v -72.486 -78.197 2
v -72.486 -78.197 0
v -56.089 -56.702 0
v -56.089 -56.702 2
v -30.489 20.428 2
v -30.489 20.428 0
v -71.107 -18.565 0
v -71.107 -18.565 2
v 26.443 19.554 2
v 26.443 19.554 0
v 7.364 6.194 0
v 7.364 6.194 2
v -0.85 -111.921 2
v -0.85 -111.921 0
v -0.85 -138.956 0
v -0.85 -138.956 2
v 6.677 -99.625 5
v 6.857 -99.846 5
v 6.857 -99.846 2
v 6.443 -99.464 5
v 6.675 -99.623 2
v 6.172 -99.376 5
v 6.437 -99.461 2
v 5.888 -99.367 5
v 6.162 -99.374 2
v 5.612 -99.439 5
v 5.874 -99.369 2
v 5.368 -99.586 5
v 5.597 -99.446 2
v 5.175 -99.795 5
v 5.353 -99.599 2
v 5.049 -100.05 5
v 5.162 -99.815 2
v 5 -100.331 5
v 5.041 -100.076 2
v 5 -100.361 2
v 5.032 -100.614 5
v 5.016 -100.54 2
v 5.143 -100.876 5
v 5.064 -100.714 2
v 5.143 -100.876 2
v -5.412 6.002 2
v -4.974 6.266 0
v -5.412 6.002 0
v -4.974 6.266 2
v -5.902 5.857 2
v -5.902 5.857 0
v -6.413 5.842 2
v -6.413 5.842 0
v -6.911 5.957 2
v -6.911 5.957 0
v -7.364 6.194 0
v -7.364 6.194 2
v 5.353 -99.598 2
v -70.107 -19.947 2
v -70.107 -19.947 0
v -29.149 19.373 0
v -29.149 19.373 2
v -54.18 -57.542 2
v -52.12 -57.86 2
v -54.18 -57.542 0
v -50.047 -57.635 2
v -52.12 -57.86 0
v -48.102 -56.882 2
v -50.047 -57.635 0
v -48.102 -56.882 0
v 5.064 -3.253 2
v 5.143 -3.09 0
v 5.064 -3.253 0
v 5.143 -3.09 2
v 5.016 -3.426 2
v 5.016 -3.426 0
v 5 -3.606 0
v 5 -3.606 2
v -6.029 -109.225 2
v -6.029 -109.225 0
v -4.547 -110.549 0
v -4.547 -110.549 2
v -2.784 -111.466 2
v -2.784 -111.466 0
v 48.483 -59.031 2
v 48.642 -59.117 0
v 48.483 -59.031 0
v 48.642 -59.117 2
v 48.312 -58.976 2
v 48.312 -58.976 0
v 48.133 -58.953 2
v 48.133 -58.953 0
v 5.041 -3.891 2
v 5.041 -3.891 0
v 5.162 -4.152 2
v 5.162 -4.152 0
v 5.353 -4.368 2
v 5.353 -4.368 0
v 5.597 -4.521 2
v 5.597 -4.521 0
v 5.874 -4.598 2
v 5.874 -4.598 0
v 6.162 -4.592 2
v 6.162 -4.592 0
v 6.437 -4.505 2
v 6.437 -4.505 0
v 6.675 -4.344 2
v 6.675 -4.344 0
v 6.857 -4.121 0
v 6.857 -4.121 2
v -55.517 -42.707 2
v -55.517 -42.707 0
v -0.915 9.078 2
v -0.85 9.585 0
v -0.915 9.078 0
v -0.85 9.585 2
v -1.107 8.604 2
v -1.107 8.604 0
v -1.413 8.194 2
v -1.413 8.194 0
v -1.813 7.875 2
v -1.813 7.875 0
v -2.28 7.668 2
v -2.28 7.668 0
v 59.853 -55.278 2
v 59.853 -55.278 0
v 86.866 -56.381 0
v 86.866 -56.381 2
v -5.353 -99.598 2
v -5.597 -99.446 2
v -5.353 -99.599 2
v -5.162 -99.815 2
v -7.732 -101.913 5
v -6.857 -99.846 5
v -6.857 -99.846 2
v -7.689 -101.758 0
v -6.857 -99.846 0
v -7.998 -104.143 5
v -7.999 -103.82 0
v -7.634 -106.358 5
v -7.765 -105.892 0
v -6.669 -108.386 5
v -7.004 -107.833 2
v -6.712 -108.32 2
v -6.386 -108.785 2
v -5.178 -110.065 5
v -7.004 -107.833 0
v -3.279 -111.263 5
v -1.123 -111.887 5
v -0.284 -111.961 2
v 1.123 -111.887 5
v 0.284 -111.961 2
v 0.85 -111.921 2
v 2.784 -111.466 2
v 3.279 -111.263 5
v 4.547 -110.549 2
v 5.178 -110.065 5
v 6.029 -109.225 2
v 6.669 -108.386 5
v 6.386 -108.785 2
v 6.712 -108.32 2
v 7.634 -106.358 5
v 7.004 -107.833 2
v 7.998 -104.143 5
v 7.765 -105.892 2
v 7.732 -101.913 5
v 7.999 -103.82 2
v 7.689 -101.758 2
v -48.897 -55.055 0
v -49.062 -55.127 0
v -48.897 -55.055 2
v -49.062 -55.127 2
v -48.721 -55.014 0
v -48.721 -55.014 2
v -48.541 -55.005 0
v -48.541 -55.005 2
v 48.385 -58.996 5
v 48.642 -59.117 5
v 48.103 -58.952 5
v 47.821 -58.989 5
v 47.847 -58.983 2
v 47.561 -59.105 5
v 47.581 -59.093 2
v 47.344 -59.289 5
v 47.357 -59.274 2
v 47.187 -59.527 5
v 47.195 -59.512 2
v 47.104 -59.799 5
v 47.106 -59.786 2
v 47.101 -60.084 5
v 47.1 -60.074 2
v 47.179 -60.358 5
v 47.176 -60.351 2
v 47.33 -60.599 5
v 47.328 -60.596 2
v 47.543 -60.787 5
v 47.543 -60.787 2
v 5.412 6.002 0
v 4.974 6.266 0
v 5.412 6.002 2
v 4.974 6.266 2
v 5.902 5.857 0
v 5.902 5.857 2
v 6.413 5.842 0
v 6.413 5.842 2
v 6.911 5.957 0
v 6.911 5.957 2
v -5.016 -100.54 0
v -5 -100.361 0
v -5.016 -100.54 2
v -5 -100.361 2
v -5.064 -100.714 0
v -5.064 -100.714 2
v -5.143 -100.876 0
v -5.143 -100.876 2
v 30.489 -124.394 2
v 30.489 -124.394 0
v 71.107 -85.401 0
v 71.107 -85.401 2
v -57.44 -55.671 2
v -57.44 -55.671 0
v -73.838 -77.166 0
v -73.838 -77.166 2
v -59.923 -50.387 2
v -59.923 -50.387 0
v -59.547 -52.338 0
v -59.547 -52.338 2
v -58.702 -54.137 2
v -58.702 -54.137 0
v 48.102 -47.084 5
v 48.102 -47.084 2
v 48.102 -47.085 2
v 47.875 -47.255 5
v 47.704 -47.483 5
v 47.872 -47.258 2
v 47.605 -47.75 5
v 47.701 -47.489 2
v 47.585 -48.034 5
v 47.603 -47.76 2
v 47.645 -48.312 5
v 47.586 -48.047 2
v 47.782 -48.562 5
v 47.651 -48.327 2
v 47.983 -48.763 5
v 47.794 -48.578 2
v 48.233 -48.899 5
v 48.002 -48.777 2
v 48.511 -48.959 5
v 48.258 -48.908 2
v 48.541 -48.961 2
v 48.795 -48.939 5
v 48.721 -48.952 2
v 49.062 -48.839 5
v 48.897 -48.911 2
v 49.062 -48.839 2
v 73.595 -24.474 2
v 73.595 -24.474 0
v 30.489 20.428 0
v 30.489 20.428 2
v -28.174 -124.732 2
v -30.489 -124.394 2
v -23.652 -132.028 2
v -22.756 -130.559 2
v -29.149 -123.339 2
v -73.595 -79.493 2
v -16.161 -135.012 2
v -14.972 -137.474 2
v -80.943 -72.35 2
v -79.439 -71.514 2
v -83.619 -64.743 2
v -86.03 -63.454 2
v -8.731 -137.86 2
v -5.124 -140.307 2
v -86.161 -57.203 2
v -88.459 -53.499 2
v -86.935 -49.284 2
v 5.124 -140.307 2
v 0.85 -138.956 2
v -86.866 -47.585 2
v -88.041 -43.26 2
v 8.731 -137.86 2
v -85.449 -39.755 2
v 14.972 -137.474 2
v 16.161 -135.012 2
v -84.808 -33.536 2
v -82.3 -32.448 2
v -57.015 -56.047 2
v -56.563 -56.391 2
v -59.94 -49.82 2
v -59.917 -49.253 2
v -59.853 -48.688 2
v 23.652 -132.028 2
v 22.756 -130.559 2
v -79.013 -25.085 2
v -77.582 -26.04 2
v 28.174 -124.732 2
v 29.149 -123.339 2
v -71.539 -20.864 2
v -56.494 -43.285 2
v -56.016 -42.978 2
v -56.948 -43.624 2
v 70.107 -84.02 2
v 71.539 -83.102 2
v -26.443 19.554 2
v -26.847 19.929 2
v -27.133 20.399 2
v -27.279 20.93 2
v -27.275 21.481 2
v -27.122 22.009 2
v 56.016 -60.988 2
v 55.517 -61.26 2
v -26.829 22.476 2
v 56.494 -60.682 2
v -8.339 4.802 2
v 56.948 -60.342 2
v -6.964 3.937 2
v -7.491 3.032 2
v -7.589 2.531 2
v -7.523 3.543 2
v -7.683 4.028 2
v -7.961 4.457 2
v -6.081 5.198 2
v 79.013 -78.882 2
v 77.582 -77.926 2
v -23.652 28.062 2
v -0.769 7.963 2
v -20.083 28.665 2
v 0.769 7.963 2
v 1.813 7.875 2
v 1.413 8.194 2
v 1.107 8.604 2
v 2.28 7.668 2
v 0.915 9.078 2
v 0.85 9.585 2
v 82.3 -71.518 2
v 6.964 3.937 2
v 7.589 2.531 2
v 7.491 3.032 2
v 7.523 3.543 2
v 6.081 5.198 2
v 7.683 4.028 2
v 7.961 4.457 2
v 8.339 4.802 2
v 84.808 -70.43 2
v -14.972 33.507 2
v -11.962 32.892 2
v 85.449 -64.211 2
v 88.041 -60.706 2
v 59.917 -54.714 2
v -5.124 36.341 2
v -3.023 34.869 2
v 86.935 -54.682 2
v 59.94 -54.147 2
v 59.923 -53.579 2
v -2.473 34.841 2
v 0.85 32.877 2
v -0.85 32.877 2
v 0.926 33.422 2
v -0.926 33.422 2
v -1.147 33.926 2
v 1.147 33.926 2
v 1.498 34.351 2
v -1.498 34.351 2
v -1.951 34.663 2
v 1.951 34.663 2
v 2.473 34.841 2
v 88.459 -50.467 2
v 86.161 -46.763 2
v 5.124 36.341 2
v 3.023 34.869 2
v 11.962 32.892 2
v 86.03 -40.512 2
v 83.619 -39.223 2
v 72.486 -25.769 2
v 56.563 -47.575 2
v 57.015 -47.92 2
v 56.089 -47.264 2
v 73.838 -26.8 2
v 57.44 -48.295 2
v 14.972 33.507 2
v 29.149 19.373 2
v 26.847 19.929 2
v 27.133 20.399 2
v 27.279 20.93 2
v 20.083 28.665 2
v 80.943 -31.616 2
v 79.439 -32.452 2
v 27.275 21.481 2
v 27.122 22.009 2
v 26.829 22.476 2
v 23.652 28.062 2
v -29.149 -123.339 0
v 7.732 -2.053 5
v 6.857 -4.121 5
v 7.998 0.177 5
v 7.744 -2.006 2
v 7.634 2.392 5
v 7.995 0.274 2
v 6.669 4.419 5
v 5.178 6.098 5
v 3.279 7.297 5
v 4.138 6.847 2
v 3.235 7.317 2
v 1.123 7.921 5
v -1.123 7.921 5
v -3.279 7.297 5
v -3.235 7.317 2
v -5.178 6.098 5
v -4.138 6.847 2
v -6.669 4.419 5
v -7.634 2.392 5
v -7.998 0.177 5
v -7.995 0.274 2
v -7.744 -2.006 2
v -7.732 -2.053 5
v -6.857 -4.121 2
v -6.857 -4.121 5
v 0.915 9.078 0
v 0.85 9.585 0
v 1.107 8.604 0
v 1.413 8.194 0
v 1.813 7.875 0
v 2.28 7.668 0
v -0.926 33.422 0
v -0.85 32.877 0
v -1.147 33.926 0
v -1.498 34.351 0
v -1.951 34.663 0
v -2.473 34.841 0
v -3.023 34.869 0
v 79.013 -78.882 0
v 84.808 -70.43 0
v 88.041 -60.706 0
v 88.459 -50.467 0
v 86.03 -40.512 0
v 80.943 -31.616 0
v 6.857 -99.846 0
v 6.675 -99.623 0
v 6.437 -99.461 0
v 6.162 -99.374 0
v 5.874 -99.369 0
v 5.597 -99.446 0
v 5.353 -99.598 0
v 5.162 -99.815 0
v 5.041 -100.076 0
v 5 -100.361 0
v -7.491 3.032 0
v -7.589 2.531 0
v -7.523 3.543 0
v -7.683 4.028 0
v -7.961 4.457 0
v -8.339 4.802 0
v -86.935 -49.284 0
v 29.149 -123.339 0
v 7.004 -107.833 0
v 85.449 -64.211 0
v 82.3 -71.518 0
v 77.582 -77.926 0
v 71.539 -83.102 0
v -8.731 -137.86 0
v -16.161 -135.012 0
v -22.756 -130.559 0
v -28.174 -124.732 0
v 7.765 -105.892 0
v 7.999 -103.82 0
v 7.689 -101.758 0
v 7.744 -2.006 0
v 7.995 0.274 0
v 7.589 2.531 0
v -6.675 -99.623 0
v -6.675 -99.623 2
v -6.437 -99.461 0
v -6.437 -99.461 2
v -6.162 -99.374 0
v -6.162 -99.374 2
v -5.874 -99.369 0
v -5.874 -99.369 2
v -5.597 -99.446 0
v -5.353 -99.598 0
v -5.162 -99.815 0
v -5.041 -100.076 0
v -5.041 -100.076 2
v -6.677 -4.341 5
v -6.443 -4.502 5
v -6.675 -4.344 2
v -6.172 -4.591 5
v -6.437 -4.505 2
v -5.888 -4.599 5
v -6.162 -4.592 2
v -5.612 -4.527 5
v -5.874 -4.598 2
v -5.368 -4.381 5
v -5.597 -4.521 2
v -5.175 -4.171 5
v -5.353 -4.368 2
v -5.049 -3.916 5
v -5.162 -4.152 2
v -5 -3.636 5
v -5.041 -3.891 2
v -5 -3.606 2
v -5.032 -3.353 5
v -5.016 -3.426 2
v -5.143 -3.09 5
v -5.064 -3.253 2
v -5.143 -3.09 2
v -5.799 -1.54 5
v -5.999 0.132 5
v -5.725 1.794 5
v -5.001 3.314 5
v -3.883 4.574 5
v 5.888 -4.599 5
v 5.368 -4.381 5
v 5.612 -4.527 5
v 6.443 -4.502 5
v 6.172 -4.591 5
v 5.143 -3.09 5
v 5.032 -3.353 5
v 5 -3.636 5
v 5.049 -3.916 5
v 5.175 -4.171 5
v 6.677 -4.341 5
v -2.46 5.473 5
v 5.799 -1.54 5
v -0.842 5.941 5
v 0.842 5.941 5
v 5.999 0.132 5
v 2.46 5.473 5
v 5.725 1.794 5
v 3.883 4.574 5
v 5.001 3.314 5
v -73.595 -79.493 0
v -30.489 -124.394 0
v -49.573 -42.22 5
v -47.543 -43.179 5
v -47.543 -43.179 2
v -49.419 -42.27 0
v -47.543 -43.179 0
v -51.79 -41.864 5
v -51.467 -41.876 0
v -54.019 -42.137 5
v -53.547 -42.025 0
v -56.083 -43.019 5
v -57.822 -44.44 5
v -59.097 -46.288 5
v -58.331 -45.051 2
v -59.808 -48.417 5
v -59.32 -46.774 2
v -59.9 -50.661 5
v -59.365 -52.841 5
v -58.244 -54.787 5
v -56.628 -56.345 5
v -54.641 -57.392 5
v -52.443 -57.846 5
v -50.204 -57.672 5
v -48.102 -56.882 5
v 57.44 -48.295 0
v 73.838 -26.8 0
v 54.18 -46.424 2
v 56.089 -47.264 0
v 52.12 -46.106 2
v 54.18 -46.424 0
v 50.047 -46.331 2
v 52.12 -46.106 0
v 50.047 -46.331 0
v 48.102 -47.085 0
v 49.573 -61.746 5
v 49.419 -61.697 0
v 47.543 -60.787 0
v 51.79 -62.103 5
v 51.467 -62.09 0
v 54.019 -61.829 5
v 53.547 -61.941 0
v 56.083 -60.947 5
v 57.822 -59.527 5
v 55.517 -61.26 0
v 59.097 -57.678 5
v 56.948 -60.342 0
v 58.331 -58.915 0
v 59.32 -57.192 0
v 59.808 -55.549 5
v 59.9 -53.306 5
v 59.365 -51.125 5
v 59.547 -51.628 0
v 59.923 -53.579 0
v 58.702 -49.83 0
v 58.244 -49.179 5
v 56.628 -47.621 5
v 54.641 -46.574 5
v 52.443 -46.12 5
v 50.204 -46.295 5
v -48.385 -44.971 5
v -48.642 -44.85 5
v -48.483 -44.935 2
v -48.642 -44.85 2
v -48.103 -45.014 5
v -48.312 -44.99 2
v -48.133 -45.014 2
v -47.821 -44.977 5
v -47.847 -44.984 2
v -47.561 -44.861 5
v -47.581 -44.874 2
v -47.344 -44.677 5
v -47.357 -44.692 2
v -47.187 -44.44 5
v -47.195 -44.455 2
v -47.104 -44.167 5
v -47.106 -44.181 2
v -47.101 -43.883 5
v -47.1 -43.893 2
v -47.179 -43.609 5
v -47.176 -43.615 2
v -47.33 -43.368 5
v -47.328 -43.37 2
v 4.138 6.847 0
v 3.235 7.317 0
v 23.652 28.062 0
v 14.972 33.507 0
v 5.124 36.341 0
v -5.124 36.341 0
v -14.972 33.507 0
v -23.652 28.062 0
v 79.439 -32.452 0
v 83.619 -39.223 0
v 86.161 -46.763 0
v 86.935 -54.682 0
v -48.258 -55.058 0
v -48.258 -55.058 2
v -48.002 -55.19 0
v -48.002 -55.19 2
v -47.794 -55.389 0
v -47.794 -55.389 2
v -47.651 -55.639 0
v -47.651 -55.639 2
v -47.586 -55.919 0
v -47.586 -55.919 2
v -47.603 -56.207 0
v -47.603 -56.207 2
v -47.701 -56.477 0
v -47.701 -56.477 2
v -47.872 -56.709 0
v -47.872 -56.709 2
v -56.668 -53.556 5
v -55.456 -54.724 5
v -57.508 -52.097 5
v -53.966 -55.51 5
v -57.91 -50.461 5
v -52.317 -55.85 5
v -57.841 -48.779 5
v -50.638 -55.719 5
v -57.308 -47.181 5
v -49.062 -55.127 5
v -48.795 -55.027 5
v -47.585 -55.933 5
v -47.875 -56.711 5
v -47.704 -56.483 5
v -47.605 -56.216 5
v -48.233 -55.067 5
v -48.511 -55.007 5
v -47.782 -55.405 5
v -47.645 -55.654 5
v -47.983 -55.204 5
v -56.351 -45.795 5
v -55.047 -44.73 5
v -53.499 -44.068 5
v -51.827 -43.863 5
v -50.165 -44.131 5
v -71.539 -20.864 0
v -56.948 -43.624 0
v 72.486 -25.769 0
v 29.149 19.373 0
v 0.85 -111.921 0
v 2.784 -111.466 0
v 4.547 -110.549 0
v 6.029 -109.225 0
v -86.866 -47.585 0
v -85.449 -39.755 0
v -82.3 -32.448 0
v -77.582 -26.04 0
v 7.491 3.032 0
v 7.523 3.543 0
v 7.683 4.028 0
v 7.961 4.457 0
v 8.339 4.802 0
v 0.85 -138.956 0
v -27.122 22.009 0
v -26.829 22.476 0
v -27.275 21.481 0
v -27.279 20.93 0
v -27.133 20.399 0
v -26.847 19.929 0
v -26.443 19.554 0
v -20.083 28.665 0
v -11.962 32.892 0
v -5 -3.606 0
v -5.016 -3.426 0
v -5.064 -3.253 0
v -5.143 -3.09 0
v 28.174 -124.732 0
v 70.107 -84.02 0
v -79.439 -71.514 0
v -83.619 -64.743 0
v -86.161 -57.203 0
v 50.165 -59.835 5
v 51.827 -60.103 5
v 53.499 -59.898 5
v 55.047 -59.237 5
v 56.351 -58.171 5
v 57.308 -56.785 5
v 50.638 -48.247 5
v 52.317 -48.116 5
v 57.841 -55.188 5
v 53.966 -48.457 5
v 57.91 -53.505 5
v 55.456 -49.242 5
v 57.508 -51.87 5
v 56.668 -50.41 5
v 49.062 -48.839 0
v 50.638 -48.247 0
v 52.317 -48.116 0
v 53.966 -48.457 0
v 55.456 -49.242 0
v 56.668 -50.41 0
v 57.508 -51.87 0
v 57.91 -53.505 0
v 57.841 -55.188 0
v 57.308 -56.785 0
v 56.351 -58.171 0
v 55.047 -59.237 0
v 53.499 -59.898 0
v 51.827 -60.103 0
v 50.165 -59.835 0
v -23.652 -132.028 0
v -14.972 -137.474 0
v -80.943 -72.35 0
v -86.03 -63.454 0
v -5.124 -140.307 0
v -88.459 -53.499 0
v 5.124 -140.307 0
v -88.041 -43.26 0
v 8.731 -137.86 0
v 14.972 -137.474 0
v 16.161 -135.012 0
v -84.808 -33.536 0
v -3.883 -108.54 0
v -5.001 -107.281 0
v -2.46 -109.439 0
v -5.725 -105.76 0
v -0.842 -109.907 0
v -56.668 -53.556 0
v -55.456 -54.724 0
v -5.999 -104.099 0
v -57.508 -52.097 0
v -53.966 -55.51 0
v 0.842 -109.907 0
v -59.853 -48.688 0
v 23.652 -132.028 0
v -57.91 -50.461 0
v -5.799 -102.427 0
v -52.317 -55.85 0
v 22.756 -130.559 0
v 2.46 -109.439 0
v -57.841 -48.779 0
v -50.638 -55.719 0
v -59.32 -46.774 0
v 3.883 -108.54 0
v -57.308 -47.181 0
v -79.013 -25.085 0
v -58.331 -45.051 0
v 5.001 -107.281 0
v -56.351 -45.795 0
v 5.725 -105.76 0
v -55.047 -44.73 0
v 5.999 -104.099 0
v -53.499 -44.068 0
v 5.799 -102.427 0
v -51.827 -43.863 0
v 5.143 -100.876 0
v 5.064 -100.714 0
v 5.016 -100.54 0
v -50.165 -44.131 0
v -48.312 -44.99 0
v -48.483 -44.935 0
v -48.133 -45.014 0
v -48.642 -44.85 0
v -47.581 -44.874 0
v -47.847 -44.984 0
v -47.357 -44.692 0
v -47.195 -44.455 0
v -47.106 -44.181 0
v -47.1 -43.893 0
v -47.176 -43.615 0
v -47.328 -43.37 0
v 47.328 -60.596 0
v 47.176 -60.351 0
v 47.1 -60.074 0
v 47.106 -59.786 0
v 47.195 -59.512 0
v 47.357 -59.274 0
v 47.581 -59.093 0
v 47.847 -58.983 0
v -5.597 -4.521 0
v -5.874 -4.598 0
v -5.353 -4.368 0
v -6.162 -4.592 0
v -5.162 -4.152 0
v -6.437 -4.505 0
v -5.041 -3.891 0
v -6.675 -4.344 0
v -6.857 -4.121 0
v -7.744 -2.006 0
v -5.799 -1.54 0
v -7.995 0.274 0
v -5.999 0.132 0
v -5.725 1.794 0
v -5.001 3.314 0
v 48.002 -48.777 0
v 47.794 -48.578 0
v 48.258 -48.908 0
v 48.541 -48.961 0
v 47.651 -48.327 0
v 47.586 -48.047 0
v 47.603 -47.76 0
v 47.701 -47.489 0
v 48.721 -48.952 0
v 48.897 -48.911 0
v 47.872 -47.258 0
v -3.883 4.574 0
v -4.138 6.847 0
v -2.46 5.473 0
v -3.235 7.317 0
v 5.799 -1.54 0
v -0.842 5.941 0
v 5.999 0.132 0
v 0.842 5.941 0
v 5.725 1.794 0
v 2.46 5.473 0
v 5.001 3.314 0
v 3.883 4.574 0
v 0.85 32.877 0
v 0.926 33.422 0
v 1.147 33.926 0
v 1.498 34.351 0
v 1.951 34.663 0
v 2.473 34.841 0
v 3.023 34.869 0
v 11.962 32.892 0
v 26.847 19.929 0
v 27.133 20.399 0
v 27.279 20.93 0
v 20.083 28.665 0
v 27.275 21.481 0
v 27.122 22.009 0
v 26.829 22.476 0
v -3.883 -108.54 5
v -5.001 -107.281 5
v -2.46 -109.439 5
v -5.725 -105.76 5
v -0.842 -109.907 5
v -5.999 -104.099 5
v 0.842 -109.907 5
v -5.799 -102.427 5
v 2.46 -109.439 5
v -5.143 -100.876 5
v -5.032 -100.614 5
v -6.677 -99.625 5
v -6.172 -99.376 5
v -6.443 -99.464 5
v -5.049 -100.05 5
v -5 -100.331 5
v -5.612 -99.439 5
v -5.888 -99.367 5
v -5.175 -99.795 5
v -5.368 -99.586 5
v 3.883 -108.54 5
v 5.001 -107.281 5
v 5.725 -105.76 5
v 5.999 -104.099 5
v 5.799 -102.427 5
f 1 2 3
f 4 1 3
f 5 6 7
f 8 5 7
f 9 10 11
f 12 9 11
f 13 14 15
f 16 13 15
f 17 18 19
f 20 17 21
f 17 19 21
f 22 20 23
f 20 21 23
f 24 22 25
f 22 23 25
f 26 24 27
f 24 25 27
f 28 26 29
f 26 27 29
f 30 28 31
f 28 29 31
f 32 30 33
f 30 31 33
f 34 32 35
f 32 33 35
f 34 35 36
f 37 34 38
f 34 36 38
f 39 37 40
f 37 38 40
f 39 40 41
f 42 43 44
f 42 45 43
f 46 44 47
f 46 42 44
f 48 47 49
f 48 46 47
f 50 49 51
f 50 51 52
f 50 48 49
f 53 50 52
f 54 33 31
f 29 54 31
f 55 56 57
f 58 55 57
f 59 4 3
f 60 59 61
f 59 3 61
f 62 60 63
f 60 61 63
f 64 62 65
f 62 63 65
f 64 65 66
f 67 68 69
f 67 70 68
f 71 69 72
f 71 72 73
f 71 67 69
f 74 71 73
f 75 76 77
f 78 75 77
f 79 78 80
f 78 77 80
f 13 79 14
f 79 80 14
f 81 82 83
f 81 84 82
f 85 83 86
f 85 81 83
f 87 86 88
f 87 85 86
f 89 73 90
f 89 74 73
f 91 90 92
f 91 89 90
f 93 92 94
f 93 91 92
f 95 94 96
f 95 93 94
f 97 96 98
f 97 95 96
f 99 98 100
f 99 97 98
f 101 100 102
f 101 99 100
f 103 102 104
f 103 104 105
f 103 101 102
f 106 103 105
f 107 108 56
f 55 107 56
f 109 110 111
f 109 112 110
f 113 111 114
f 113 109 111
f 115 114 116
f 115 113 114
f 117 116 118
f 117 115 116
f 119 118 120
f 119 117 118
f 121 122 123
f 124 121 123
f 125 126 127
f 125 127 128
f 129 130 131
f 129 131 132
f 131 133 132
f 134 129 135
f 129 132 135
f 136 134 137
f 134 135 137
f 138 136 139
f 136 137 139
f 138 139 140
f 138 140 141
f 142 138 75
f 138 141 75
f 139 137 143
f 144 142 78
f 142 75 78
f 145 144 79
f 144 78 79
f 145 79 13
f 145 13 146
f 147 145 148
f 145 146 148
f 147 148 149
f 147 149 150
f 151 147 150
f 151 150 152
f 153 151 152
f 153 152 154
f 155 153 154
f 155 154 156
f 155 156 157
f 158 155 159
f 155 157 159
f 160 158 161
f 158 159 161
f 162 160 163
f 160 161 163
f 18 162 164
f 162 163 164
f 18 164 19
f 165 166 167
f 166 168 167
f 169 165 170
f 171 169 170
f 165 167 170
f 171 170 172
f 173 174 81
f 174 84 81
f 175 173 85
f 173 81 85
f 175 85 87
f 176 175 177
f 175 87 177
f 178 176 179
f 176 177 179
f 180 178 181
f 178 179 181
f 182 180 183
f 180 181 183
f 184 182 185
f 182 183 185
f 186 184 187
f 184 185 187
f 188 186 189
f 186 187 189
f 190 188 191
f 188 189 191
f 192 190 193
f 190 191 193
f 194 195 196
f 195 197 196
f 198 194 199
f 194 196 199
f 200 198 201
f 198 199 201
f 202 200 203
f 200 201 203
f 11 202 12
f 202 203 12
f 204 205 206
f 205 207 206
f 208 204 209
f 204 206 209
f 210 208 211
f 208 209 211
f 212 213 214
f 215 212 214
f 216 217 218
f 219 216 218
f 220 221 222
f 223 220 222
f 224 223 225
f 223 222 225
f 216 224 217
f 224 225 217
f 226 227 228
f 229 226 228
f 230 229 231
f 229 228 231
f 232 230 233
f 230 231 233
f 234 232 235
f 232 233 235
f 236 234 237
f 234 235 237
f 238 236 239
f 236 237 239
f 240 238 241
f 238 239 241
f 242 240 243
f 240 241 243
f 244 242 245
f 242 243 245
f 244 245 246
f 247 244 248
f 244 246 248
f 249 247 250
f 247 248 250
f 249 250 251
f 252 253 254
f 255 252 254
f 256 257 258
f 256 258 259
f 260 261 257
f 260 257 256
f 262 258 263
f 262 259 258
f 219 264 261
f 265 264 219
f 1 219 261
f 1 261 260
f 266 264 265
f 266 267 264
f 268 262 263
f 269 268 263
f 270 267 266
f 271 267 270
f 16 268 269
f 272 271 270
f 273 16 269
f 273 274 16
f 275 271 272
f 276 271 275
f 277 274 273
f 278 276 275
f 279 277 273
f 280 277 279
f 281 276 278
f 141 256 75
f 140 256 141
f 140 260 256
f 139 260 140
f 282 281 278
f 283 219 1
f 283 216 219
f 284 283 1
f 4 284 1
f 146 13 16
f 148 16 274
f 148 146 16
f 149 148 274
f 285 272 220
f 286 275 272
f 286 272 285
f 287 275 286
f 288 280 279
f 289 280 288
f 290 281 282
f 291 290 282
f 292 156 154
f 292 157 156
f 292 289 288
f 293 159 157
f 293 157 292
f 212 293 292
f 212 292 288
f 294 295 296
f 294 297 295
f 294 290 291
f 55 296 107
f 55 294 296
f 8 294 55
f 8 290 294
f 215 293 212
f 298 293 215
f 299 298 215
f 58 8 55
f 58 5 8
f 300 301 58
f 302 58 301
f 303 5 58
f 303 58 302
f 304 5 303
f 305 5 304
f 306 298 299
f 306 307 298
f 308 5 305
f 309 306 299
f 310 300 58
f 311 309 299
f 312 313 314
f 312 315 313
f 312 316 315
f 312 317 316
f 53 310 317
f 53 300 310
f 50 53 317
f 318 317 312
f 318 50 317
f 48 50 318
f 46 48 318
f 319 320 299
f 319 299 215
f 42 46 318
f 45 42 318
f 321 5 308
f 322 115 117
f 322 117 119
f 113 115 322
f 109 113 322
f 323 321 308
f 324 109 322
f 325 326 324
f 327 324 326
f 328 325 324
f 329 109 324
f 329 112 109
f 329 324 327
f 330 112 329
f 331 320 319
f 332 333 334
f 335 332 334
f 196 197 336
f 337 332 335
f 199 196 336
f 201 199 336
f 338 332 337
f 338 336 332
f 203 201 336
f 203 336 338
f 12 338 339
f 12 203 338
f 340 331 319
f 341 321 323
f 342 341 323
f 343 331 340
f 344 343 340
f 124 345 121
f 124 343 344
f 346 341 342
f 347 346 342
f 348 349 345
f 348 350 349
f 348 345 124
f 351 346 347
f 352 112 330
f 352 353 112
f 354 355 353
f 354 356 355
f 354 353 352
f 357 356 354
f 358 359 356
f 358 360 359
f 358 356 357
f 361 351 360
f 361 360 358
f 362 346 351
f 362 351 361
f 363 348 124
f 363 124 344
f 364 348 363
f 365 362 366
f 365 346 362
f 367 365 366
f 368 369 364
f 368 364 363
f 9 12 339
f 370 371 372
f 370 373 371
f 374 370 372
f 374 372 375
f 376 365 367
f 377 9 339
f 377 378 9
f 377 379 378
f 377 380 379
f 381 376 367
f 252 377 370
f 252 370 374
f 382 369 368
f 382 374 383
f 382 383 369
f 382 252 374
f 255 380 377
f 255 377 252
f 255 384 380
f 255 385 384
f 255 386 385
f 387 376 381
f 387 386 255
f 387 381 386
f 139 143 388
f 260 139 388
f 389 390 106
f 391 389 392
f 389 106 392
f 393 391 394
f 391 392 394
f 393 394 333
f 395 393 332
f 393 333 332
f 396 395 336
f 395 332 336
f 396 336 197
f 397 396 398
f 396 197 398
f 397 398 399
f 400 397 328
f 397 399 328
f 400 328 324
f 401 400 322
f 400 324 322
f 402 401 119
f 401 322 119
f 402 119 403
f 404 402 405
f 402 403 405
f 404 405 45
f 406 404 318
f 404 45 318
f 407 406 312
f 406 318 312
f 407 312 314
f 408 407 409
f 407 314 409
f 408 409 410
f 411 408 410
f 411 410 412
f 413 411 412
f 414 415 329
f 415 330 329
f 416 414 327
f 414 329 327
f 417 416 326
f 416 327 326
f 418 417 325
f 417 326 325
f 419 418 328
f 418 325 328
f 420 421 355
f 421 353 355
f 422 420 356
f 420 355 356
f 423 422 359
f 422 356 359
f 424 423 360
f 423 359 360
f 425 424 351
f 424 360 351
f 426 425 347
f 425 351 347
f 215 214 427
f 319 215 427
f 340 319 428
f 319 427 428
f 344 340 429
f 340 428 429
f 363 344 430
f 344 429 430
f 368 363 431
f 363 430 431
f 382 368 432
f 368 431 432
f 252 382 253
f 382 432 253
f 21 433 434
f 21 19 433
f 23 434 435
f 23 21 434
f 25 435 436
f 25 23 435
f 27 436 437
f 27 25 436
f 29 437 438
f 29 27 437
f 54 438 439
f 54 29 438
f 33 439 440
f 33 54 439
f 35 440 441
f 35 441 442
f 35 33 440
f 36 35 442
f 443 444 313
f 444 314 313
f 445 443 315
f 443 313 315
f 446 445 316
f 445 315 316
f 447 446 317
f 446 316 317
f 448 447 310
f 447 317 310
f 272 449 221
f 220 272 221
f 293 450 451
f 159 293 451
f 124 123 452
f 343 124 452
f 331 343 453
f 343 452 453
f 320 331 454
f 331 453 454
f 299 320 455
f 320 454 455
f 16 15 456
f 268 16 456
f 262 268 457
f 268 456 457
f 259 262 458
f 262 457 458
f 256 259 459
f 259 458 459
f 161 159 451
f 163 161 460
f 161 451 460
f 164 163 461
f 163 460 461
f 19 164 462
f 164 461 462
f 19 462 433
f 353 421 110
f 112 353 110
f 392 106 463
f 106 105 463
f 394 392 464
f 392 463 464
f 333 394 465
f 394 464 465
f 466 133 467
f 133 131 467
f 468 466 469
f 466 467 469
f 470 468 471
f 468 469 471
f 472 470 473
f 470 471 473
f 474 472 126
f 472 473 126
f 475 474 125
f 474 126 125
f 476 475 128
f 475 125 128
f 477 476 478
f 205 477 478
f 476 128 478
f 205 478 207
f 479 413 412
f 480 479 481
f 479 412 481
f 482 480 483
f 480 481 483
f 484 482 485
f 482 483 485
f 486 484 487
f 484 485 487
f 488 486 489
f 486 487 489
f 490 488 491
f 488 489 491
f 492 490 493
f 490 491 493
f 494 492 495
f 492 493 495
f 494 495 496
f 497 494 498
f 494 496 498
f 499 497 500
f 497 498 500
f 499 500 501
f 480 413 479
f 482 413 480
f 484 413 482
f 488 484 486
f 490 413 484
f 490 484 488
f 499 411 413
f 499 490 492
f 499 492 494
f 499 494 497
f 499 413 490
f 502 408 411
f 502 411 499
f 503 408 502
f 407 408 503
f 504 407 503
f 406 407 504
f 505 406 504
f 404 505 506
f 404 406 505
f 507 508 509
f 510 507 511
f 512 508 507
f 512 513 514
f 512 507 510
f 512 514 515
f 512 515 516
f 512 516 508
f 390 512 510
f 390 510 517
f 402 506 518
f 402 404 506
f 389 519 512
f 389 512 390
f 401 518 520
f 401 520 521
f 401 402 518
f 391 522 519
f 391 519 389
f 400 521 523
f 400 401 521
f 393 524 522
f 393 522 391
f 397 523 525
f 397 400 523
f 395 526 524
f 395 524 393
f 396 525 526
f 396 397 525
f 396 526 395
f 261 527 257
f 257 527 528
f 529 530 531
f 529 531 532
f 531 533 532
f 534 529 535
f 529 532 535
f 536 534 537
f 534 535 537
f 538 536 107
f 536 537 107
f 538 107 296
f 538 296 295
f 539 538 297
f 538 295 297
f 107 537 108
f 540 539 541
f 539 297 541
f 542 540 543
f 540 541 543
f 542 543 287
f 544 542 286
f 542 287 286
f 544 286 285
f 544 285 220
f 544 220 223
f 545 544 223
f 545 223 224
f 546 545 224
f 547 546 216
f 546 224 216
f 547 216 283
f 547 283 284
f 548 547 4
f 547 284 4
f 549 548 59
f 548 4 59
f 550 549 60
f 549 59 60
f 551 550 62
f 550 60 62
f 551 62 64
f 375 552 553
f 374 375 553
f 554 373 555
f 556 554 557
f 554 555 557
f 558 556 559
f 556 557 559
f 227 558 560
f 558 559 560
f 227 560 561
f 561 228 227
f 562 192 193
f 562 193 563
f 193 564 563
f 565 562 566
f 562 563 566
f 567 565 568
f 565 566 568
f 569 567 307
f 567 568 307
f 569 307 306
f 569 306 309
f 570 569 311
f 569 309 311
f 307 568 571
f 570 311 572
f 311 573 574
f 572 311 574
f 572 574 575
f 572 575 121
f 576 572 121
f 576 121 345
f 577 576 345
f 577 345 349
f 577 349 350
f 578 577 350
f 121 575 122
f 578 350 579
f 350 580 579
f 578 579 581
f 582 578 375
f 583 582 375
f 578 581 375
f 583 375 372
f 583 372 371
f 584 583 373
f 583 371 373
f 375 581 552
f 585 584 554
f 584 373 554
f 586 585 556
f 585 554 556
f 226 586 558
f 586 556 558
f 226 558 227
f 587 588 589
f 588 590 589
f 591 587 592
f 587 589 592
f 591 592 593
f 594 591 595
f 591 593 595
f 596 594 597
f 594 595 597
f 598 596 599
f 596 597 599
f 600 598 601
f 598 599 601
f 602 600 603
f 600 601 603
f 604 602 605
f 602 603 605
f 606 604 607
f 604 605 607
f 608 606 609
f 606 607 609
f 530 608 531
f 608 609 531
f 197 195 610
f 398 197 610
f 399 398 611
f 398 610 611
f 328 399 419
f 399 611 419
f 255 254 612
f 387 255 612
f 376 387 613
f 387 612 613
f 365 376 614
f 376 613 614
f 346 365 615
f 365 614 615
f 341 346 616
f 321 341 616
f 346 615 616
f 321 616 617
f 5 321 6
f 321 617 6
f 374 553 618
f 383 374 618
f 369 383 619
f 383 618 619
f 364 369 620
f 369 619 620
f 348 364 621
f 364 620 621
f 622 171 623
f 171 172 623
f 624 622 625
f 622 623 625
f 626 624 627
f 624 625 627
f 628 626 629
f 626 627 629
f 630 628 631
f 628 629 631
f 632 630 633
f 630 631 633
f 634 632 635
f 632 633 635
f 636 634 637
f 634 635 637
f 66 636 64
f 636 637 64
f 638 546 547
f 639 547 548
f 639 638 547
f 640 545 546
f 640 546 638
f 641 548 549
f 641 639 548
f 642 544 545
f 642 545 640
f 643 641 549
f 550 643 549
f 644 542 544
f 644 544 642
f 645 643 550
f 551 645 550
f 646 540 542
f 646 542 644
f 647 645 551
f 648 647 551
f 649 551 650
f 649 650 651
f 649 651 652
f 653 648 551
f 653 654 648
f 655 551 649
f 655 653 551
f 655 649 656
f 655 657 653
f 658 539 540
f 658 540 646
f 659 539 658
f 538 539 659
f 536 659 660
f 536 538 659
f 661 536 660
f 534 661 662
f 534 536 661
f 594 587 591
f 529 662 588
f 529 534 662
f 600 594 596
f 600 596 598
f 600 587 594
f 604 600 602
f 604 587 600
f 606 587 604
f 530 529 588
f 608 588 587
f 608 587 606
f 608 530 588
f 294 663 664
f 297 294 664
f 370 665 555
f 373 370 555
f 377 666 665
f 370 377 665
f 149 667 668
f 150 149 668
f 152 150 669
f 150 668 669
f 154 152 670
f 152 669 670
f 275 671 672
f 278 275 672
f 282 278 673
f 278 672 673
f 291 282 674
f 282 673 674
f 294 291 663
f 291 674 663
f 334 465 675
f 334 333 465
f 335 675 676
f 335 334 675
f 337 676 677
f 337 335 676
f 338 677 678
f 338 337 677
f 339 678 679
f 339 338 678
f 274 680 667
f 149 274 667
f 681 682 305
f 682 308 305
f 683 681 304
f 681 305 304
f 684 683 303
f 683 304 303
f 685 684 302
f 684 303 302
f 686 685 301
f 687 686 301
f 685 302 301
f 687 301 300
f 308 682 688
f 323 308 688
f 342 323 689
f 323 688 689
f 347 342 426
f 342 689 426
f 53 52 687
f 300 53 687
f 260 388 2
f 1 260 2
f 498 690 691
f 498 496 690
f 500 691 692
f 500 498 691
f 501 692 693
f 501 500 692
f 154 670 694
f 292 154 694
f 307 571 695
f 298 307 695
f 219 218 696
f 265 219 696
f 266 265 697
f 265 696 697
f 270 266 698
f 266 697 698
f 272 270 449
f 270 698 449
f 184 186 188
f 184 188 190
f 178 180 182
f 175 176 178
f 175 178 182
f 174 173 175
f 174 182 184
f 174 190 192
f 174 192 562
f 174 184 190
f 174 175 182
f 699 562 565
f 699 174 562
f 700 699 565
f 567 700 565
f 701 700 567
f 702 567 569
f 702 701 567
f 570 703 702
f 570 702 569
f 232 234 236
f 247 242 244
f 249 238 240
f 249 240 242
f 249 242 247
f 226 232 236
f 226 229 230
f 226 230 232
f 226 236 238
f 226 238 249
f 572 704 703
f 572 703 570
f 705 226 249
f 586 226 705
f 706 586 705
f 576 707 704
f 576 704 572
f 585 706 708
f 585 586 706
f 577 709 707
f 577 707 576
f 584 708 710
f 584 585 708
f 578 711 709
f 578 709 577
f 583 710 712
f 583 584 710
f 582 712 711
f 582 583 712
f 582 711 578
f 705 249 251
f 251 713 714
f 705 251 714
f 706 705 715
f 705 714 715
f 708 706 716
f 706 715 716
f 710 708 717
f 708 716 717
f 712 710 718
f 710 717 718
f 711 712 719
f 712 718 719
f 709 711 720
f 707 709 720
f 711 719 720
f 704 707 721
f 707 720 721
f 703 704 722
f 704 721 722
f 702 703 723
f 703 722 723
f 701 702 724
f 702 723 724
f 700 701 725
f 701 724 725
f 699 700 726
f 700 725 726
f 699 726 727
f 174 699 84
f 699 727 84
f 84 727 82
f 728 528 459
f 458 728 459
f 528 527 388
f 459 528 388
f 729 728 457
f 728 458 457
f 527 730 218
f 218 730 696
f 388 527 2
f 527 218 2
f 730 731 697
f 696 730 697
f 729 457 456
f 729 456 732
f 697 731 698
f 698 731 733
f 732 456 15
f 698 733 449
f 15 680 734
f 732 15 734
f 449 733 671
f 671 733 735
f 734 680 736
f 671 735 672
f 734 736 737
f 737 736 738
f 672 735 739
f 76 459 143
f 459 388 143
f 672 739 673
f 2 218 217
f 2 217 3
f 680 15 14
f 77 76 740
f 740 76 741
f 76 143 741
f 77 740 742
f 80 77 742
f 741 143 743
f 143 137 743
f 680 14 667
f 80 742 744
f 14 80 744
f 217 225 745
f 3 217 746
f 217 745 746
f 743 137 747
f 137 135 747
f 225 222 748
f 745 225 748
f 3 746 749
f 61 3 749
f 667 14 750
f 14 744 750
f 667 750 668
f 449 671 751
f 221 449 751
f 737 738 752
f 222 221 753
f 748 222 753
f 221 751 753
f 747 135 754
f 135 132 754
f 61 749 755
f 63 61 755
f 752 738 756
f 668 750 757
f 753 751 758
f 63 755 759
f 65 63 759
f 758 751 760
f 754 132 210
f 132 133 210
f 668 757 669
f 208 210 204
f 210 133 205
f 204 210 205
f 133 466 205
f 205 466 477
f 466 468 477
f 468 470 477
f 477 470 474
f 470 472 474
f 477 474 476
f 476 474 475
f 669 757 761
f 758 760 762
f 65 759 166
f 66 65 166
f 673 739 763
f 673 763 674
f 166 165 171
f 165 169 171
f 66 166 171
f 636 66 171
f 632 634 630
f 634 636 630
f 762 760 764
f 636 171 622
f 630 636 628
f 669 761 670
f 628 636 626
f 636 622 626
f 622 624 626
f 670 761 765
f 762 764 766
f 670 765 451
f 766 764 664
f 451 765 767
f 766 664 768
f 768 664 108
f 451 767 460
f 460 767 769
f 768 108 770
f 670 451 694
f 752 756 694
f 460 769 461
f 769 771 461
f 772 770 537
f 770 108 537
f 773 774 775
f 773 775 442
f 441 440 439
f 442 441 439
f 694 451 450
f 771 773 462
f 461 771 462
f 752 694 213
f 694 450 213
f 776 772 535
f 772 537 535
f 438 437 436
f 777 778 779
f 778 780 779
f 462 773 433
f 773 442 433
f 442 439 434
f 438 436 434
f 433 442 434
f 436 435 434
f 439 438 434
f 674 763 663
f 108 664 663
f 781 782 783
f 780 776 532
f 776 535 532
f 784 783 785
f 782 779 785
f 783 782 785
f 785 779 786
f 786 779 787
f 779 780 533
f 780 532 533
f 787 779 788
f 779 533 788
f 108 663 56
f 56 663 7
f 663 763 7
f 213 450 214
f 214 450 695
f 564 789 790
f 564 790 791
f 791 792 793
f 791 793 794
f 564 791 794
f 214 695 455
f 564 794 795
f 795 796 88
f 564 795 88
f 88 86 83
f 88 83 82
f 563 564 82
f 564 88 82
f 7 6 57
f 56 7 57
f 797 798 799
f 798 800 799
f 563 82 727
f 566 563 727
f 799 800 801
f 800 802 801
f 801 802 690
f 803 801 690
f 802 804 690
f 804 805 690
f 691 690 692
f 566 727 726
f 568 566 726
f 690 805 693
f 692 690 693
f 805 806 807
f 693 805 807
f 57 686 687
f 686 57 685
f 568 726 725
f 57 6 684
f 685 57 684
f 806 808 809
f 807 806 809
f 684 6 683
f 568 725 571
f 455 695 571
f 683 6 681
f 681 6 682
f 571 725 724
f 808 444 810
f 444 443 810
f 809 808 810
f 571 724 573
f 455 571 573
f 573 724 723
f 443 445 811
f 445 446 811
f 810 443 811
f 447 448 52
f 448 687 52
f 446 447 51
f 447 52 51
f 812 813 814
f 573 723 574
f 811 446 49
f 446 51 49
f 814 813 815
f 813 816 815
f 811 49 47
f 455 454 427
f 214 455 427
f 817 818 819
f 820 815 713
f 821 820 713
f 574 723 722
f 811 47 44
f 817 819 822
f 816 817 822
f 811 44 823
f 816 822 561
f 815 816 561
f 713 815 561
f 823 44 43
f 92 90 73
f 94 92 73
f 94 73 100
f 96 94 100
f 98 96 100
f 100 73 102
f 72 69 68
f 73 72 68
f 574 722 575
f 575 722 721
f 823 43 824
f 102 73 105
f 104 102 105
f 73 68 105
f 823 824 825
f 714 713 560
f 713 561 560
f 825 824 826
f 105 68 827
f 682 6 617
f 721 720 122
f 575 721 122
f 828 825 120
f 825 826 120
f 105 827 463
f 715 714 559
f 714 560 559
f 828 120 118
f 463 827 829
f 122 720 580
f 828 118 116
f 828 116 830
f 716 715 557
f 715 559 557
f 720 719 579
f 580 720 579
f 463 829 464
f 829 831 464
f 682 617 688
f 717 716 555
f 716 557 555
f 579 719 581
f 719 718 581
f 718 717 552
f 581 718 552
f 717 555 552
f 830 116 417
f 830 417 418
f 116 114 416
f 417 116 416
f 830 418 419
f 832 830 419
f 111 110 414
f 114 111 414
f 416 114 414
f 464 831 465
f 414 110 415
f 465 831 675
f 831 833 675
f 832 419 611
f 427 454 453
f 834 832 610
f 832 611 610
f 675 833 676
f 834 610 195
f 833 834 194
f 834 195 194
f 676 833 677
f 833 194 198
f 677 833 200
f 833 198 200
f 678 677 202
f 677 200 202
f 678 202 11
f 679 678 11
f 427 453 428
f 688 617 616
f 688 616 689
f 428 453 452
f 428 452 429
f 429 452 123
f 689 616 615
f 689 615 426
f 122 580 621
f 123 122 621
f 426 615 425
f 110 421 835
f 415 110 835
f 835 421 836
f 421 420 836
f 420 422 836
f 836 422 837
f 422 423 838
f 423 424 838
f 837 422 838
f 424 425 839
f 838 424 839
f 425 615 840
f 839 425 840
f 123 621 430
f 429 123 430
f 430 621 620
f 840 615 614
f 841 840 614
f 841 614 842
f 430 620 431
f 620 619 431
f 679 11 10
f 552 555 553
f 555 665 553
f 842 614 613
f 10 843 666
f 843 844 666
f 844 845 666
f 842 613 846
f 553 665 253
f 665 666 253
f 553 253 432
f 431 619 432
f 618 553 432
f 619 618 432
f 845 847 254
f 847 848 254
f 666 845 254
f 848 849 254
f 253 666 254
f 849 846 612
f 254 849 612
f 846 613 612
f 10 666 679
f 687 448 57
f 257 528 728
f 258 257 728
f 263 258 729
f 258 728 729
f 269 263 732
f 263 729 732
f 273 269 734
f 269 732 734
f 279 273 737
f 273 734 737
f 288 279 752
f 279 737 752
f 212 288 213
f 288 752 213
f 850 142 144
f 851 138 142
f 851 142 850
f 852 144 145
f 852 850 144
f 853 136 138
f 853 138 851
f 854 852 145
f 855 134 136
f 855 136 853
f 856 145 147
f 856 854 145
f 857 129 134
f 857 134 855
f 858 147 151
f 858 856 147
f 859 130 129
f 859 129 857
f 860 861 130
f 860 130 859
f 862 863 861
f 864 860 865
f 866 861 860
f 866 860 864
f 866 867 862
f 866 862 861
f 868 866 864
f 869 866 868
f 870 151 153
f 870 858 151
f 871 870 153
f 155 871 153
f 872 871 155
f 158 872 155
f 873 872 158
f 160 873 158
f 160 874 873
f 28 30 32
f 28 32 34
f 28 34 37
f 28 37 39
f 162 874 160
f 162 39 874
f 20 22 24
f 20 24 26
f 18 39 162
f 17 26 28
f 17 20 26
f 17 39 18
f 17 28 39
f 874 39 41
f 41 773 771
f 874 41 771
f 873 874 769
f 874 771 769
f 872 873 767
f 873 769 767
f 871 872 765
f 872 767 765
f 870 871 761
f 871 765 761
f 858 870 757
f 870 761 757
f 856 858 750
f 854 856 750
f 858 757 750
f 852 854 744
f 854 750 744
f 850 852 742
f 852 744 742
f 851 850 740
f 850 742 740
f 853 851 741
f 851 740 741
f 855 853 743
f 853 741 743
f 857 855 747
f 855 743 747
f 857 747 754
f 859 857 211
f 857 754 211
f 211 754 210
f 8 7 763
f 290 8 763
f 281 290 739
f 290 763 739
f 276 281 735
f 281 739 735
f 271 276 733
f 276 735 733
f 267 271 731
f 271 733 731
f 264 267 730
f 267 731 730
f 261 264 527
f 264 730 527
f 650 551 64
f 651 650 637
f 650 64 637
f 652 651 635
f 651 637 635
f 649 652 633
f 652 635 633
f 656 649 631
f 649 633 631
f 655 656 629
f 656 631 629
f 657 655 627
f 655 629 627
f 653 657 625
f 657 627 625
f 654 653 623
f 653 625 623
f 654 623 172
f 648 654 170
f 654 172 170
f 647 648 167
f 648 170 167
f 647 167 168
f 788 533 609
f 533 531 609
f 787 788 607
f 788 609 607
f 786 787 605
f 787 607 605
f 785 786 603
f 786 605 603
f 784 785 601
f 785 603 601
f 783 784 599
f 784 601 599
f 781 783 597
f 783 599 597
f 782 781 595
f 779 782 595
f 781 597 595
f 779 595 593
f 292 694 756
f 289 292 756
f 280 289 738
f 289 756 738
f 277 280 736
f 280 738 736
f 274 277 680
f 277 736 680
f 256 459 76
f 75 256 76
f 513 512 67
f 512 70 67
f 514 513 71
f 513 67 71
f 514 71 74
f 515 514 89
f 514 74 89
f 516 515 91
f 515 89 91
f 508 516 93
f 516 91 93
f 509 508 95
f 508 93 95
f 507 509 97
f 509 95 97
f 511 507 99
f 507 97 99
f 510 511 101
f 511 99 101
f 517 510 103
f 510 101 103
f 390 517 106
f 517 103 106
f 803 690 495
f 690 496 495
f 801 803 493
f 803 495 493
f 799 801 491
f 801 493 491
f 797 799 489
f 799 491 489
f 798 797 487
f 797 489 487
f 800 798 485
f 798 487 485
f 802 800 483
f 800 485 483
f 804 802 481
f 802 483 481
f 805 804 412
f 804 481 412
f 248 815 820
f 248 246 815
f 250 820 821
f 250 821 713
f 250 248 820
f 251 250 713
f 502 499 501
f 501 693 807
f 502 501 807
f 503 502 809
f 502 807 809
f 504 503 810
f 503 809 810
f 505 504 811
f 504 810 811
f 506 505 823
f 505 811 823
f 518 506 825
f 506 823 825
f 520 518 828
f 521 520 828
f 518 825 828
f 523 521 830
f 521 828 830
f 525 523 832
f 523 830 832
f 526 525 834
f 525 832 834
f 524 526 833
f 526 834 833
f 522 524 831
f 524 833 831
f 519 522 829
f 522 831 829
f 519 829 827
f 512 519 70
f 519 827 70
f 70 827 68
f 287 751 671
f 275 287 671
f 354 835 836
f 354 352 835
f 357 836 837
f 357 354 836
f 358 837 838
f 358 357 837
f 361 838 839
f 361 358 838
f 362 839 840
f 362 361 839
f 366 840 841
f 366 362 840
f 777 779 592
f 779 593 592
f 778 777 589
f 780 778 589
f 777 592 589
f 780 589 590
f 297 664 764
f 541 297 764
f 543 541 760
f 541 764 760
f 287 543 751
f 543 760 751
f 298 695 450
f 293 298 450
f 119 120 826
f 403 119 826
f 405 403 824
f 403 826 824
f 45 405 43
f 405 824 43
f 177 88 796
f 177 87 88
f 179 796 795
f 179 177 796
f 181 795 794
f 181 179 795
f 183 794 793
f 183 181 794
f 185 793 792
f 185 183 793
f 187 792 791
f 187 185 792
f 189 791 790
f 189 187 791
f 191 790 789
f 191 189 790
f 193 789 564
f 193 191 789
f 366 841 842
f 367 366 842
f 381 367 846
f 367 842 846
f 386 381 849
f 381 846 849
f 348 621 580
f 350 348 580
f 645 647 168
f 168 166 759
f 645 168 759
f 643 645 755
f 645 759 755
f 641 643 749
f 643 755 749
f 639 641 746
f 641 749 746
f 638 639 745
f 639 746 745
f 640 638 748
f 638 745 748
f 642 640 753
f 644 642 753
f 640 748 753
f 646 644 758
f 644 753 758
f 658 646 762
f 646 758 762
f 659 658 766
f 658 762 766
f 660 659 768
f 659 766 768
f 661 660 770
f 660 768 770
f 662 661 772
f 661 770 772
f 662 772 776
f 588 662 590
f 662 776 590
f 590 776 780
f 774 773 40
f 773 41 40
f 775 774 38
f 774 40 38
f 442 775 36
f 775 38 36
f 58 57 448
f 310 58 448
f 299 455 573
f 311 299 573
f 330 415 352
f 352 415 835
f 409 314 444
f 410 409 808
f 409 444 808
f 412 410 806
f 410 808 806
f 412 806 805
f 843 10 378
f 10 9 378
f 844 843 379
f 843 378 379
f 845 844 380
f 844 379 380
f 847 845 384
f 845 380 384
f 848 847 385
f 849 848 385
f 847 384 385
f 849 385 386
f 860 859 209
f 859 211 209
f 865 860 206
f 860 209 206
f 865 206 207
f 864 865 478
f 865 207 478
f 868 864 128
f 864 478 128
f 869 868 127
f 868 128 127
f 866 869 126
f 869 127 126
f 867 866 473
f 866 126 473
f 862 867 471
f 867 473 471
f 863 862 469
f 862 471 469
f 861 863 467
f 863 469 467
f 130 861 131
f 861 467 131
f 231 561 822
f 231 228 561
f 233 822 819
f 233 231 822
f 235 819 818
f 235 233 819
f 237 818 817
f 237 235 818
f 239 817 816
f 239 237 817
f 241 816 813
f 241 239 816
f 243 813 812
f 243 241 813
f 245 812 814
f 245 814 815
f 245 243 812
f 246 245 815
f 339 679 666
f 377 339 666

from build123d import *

# Parameters (mm, degrees)
F1_DEPTH = 2
F2_R     = 0.99999
F3_R     = 2
F6_DEPTH = 3


# Not quite as in the source:
# - a fillet or chamfer is up to 0.001 mm smaller than in the source, because OpenCascade refuses the exact size


with BuildPart() as f1:
    # F0 (on Top) → F1 (new body)
    with BuildSketch(Plane.XY):
        with BuildLine():
            Line((73.5948921635, -24.4738152558), (30.4890723007, 20.4280804346))
            ThreePointArc((30.4890723007, 20.4280804346), (0, 36.7), (-30.4890723007, 20.4280804346))
            Line((-30.4890723007, 20.4280804346), (-71.107024482, -18.5651536595))
            ThreePointArc((-71.107024482, -18.5651536595), (-88.6093292458, -48.364956076), (-73.5948921635, -79.4925254511))
            Line((-73.5948921635, -79.4925254511), (-30.4890723007, -124.3944211415))
            ThreePointArc((-30.4890723007, -124.3944211415), (0, -140.666340707), (30.4890723007, -124.3944211415))
            Line((30.4890723007, -124.3944211415), (71.107024482, -85.4011870475))
            ThreePointArc((71.107024482, -85.4011870475), (88.6093292458, -55.601384631), (73.5948921635, -24.4738152558))
        make_face()
        with BuildLine():
            Line((-28.1743255129, -124.7318742155), (-6.0285815603, -109.2252573607))
            ThreePointArc((-6.0285815603, -109.2252573607), (-3.6939889059, -111.0624273724), (-0.85, -111.9210562896))
            Line((-0.85, -111.9210562896), (-0.85, -138.9560177561))
            ThreePointArc((-0.85, -138.9560177561), (-16.1612014632, -135.0117198682), (-28.1743255129, -124.7318742155))
        make_face(mode=Mode.SUBTRACT)
        with BuildLine():
            ThreePointArc((-59.9226587205, -50.3870367891), (-59.1807775846, -53.2636891654), (-57.4403870983, -55.6712932586))
            Line((-57.4403870983, -55.6712932586), (-73.8376241337, -77.1659381522))
            ThreePointArc((-73.8376241337, -77.1659381522), (-83.618782922, -64.7434058486), (-86.9351098111, -49.2840283695))
            Line((-86.9351098111, -49.2840283695), (-59.9226587205, -50.3870367891))
        make_face(mode=Mode.SUBTRACT)
        with BuildLine():
            ThreePointArc((-5, -3.3166247904), (0, 6), (5, -3.3166247904))
            Line((5, -3.3166247904), (5, -6.2449979984))
            ThreePointArc((5, -6.2449979984), (7.847410611, -1.555039132), (7.0036615021, 3.8663581784))
            Line((7.0036615021, 3.8663581784), (29.1494054547, 19.3729750332))
            Line((29.1494054547, 19.3729750332), (72.4860077697, -25.7693190449))
            Line((72.4860077697, -25.7693190449), (56.0887707343, -47.2639639384))
            ThreePointArc((56.0887707343, -47.2639639384), (50.7063118949, -46.1997279693), (45.9040856171, -48.8534205162))
            Line((45.9040856171, -48.8534205162), (48.830020546, -48.9728961925))
            ThreePointArc((48.830020546, -48.9728961925), (57.9348912774, -54.3488450807), (48.4220272071, -58.9645697978))
            Line((48.4220272071, -58.9645697978), (45.4960922782, -58.8450941215))
            ThreePointArc((45.4960922782, -58.8450941215), (50.0659736435, -61.8814810638), (55.5172812862, -61.2596238927))
            Line((55.5172812862, -61.2596238927), (70.1074551181, -84.0195880634))
            Line((70.1074551181, -84.0195880634), (29.1494054547, -123.3393157402))
            Line((29.1494054547, -123.3393157402), (7.0036615021, -107.8326988854))
            ThreePointArc((7.0036615021, -107.8326988854), (7.847410611, -102.411301575), (5, -97.7213427086))
            Line((5, -97.7213427086), (5, -100.6497159166))
            ThreePointArc((5, -100.6497159166), (0, -109.966340707), (-5, -100.6497159166))
            Line((-5, -100.6497159166), (-5, -97.7213427086))
            ThreePointArc((-5, -97.7213427086), (-7.847410611, -102.411301575), (-7.0036615021, -107.8326988854))
            Line((-7.0036615021, -107.8326988854), (-29.1494054547, -123.3393157402))
            Line((-29.1494054547, -123.3393157402), (-72.4860077697, -78.1970216621))
            Line((-72.4860077697, -78.1970216621), (-56.0887707343, -56.7023767685))
            ThreePointArc((-56.0887707343, -56.7023767685), (-50.7063118949, -57.7666127376), (-45.9040856171, -55.1129201908))
            Line((-45.9040856171, -55.1129201908), (-48.830020546, -54.9934445145))
            ThreePointArc((-48.830020546, -54.9934445145), (-57.9348912774, -49.6174956263), (-48.4220272071, -45.0017709092))
            Line((-48.4220272071, -45.0017709092), (-45.4960922782, -45.1212465855))
            ThreePointArc((-45.4960922782, -45.1212465855), (-50.0659736435, -42.0848596432), (-55.5172812862, -42.7067168143))
            Line((-55.5172812862, -42.7067168143), (-70.1074551181, -19.9467526436))
            Line((-70.1074551181, -19.9467526436), (-29.1494054547, 19.3729750332))
            Line((-29.1494054547, 19.3729750332), (-7.0036615021, 3.8663581784))
            ThreePointArc((-7.0036615021, 3.8663581784), (-7.847410611, -1.555039132), (-5, -6.2449979984))
            Line((-5, -6.2449979984), (-5, -3.3166247904))
        make_face(mode=Mode.SUBTRACT)
        with BuildLine():
            Line((0.85, -138.9560177561), (0.85, -111.9210562896))
            ThreePointArc((0.85, -111.9210562896), (3.6939889059, -111.0624273724), (6.0285815603, -109.2252573607))
            Line((6.0285815603, -109.2252573607), (28.1743255129, -124.7318742155))
            ThreePointArc((28.1743255129, -124.7318742155), (16.1612014632, -135.0117198682), (0.85, -138.9560177561))
        make_face(mode=Mode.SUBTRACT)
        with BuildLine():
            ThreePointArc((56.9484628744, -60.3421712992), (58.8793530111, -58.0844778314), (59.8532998529, -55.2778884308))
            Line((59.8532998529, -55.2778884308), (86.8657509435, -56.3808968503))
            ThreePointArc((86.8657509435, -56.3808968503), (82.300050413, -71.5184248765), (71.5386367063, -83.1021354698))
            Line((71.5386367063, -83.1021354698), (56.9484628744, -60.3421712992))
        make_face(mode=Mode.SUBTRACT)
        with BuildLine():
            ThreePointArc((-56.9484628744, -43.6241694078), (-58.8793530111, -45.8818628756), (-59.8532998529, -48.6884522762))
            Line((-59.8532998529, -48.6884522762), (-86.8657509435, -47.5854438566))
            ThreePointArc((-86.8657509435, -47.5854438566), (-82.300050413, -32.4479158305), (-71.5386367063, -20.8642052372))
            Line((-71.5386367063, -20.8642052372), (-56.9484628744, -43.6241694078))
        make_face(mode=Mode.SUBTRACT)
        with BuildLine():
            ThreePointArc((-0.85, 7.9547155826), (-3.6939889059, 7.0960866654), (-6.0285815603, 5.2589166537))
            Line((-6.0285815603, 5.2589166537), (-28.1743255129, 20.7655335085))
            ThreePointArc((-28.1743255129, 20.7655335085), (-16.1612014632, 31.0453791612), (-0.85, 34.9896770491))
            Line((-0.85, 34.9896770491), (-0.85, 7.9547155826))
        make_face(mode=Mode.SUBTRACT)
        with BuildLine():
            ThreePointArc((59.9226587205, -53.5793039179), (59.1807775846, -50.7026515416), (57.4403870983, -48.2950474484))
            Line((57.4403870983, -48.2950474484), (73.8376241337, -26.8004025548))
            ThreePointArc((73.8376241337, -26.8004025548), (83.618782922, -39.2229348584), (86.9351098111, -54.6823123374))
            Line((86.9351098111, -54.6823123374), (59.9226587205, -53.5793039179))
        make_face(mode=Mode.SUBTRACT)
        with BuildLine():
            ThreePointArc((0.85, 34.9896770491), (16.1612014632, 31.0453791612), (28.1743255129, 20.7655335085))
            Line((28.1743255129, 20.7655335085), (6.0285815603, 5.2589166537))
            ThreePointArc((6.0285815603, 5.2589166537), (3.6939889059, 7.0960866654), (0.85, 7.9547155826))
            Line((0.85, 7.9547155826), (0.85, 34.9896770491))
        make_face(mode=Mode.SUBTRACT)
    extrude(amount=F1_DEPTH)

    # F2 (radius 1 in the source; OpenCascade refuses exactly that, so slightly less here)
    f2_edges = [f1.edges().sort_by_distance(p)[0] for p in [
        (-5, -3.316625, 1),
        (-5, -6.244998, 1),
        (5, -3.316625, 1),
        (5, -6.244998, 1),
        (48.830021, -48.972896, 1),
        (45.904086, -48.853421, 1),
        (48.422027, -58.96457, 1),
        (45.496092, -58.845094, 1),
        (5, -100.649716, 1),
        (5, -97.721343, 1),
        (-5, -97.721343, 1),
        (-5, -100.649716, 1),
        (-48.830021, -54.993445, 1),
        (-45.904086, -55.11292, 1),
        (-48.422027, -45.001771, 1),
        (-45.496092, -45.121247, 1),
    ]]
    fillet(f2_edges, radius=F2_R)

    # F3
    f3_edges = [f1.edges().sort_by_distance(p)[0] for p in [
        (6.028582, 5.258917, 1),
        (0.85, 7.954716, 1),
        (7.003662, 3.866358, 1),
        (-0.85, 7.954716, 1),
        (-7.003662, 3.866358, 1),
        (-6.028582, 5.258917, 1),
        (28.174326, 20.765534, 1),
        (-28.174326, 20.765534, 1),
        (-0.85, 34.989677, 1),
        (0.85, 34.989677, 1),
    ]]
    fillet(f3_edges, radius=F3_R)

    # F5 (on face) → F6 (join)
    with BuildSketch(Plane.XY.offset(2)):
        with BuildLine():
            ThreePointArc((-49.0618129875, -55.126955847), (-57.9348912774, -49.6174956263), (-48.6421626961, -44.8498058529))
            ThreePointArc((-48.6421626961, -44.8498058529), (-47.2571276636, -44.5640122932), (-47.5429212234, -43.1789772607))
            ThreePointArc((-47.5429212234, -43.1789772607), (-59.9332259985, -49.5358969586), (-48.1024549453, -56.8818439194))
            ThreePointArc((-48.1024549453, -56.8818439194), (-47.7046899302, -55.5247208621), (-49.0618129875, -55.126955847))
        make_face()
        with BuildLine():
            ThreePointArc((-6.8571428571, -99.8457106779), (0, -111.966340707), (6.8571428571, -99.8457106779))
            ThreePointArc((6.8571428571, -99.8457106779), (5.4849212464, -99.5036465744), (5.1428571429, -100.8758681852))
            ThreePointArc((5.1428571429, -100.8758681852), (0, -109.966340707), (-5.1428571429, -100.8758681852))
            ThreePointArc((-5.1428571429, -100.8758681852), (-5.4849212464, -99.5036465744), (-6.8571428571, -99.8457106779))
        make_face()
        with BuildLine():
            ThreePointArc((49.0618129875, -48.83938486), (57.9348912774, -54.3488450807), (48.6421626961, -59.1165348541))
            ThreePointArc((48.6421626961, -59.1165348541), (47.2571276636, -59.4023284138), (47.5429212234, -60.7873634463))
            ThreePointArc((47.5429212234, -60.7873634463), (59.9332259985, -54.4304437484), (48.1024549453, -47.0844967876))
            ThreePointArc((48.1024549453, -47.0844967876), (47.7046899302, -48.4416198449), (49.0618129875, -48.83938486))
        make_face()
        with BuildLine():
            ThreePointArc((-5.1428571429, -3.0904725218), (0, 6), (5.1428571429, -3.0904725218))
            ThreePointArc((5.1428571429, -3.0904725218), (5.4849212464, -4.4626941326), (6.8571428571, -4.1206300291))
            ThreePointArc((6.8571428571, -4.1206300291), (0, 8), (-6.8571428571, -4.1206300291))
            ThreePointArc((-6.8571428571, -4.1206300291), (-5.4849212464, -4.4626941326), (-5.1428571429, -3.0904725218))
        make_face()
    extrude(amount=F6_DEPTH)


solid = f1.part
